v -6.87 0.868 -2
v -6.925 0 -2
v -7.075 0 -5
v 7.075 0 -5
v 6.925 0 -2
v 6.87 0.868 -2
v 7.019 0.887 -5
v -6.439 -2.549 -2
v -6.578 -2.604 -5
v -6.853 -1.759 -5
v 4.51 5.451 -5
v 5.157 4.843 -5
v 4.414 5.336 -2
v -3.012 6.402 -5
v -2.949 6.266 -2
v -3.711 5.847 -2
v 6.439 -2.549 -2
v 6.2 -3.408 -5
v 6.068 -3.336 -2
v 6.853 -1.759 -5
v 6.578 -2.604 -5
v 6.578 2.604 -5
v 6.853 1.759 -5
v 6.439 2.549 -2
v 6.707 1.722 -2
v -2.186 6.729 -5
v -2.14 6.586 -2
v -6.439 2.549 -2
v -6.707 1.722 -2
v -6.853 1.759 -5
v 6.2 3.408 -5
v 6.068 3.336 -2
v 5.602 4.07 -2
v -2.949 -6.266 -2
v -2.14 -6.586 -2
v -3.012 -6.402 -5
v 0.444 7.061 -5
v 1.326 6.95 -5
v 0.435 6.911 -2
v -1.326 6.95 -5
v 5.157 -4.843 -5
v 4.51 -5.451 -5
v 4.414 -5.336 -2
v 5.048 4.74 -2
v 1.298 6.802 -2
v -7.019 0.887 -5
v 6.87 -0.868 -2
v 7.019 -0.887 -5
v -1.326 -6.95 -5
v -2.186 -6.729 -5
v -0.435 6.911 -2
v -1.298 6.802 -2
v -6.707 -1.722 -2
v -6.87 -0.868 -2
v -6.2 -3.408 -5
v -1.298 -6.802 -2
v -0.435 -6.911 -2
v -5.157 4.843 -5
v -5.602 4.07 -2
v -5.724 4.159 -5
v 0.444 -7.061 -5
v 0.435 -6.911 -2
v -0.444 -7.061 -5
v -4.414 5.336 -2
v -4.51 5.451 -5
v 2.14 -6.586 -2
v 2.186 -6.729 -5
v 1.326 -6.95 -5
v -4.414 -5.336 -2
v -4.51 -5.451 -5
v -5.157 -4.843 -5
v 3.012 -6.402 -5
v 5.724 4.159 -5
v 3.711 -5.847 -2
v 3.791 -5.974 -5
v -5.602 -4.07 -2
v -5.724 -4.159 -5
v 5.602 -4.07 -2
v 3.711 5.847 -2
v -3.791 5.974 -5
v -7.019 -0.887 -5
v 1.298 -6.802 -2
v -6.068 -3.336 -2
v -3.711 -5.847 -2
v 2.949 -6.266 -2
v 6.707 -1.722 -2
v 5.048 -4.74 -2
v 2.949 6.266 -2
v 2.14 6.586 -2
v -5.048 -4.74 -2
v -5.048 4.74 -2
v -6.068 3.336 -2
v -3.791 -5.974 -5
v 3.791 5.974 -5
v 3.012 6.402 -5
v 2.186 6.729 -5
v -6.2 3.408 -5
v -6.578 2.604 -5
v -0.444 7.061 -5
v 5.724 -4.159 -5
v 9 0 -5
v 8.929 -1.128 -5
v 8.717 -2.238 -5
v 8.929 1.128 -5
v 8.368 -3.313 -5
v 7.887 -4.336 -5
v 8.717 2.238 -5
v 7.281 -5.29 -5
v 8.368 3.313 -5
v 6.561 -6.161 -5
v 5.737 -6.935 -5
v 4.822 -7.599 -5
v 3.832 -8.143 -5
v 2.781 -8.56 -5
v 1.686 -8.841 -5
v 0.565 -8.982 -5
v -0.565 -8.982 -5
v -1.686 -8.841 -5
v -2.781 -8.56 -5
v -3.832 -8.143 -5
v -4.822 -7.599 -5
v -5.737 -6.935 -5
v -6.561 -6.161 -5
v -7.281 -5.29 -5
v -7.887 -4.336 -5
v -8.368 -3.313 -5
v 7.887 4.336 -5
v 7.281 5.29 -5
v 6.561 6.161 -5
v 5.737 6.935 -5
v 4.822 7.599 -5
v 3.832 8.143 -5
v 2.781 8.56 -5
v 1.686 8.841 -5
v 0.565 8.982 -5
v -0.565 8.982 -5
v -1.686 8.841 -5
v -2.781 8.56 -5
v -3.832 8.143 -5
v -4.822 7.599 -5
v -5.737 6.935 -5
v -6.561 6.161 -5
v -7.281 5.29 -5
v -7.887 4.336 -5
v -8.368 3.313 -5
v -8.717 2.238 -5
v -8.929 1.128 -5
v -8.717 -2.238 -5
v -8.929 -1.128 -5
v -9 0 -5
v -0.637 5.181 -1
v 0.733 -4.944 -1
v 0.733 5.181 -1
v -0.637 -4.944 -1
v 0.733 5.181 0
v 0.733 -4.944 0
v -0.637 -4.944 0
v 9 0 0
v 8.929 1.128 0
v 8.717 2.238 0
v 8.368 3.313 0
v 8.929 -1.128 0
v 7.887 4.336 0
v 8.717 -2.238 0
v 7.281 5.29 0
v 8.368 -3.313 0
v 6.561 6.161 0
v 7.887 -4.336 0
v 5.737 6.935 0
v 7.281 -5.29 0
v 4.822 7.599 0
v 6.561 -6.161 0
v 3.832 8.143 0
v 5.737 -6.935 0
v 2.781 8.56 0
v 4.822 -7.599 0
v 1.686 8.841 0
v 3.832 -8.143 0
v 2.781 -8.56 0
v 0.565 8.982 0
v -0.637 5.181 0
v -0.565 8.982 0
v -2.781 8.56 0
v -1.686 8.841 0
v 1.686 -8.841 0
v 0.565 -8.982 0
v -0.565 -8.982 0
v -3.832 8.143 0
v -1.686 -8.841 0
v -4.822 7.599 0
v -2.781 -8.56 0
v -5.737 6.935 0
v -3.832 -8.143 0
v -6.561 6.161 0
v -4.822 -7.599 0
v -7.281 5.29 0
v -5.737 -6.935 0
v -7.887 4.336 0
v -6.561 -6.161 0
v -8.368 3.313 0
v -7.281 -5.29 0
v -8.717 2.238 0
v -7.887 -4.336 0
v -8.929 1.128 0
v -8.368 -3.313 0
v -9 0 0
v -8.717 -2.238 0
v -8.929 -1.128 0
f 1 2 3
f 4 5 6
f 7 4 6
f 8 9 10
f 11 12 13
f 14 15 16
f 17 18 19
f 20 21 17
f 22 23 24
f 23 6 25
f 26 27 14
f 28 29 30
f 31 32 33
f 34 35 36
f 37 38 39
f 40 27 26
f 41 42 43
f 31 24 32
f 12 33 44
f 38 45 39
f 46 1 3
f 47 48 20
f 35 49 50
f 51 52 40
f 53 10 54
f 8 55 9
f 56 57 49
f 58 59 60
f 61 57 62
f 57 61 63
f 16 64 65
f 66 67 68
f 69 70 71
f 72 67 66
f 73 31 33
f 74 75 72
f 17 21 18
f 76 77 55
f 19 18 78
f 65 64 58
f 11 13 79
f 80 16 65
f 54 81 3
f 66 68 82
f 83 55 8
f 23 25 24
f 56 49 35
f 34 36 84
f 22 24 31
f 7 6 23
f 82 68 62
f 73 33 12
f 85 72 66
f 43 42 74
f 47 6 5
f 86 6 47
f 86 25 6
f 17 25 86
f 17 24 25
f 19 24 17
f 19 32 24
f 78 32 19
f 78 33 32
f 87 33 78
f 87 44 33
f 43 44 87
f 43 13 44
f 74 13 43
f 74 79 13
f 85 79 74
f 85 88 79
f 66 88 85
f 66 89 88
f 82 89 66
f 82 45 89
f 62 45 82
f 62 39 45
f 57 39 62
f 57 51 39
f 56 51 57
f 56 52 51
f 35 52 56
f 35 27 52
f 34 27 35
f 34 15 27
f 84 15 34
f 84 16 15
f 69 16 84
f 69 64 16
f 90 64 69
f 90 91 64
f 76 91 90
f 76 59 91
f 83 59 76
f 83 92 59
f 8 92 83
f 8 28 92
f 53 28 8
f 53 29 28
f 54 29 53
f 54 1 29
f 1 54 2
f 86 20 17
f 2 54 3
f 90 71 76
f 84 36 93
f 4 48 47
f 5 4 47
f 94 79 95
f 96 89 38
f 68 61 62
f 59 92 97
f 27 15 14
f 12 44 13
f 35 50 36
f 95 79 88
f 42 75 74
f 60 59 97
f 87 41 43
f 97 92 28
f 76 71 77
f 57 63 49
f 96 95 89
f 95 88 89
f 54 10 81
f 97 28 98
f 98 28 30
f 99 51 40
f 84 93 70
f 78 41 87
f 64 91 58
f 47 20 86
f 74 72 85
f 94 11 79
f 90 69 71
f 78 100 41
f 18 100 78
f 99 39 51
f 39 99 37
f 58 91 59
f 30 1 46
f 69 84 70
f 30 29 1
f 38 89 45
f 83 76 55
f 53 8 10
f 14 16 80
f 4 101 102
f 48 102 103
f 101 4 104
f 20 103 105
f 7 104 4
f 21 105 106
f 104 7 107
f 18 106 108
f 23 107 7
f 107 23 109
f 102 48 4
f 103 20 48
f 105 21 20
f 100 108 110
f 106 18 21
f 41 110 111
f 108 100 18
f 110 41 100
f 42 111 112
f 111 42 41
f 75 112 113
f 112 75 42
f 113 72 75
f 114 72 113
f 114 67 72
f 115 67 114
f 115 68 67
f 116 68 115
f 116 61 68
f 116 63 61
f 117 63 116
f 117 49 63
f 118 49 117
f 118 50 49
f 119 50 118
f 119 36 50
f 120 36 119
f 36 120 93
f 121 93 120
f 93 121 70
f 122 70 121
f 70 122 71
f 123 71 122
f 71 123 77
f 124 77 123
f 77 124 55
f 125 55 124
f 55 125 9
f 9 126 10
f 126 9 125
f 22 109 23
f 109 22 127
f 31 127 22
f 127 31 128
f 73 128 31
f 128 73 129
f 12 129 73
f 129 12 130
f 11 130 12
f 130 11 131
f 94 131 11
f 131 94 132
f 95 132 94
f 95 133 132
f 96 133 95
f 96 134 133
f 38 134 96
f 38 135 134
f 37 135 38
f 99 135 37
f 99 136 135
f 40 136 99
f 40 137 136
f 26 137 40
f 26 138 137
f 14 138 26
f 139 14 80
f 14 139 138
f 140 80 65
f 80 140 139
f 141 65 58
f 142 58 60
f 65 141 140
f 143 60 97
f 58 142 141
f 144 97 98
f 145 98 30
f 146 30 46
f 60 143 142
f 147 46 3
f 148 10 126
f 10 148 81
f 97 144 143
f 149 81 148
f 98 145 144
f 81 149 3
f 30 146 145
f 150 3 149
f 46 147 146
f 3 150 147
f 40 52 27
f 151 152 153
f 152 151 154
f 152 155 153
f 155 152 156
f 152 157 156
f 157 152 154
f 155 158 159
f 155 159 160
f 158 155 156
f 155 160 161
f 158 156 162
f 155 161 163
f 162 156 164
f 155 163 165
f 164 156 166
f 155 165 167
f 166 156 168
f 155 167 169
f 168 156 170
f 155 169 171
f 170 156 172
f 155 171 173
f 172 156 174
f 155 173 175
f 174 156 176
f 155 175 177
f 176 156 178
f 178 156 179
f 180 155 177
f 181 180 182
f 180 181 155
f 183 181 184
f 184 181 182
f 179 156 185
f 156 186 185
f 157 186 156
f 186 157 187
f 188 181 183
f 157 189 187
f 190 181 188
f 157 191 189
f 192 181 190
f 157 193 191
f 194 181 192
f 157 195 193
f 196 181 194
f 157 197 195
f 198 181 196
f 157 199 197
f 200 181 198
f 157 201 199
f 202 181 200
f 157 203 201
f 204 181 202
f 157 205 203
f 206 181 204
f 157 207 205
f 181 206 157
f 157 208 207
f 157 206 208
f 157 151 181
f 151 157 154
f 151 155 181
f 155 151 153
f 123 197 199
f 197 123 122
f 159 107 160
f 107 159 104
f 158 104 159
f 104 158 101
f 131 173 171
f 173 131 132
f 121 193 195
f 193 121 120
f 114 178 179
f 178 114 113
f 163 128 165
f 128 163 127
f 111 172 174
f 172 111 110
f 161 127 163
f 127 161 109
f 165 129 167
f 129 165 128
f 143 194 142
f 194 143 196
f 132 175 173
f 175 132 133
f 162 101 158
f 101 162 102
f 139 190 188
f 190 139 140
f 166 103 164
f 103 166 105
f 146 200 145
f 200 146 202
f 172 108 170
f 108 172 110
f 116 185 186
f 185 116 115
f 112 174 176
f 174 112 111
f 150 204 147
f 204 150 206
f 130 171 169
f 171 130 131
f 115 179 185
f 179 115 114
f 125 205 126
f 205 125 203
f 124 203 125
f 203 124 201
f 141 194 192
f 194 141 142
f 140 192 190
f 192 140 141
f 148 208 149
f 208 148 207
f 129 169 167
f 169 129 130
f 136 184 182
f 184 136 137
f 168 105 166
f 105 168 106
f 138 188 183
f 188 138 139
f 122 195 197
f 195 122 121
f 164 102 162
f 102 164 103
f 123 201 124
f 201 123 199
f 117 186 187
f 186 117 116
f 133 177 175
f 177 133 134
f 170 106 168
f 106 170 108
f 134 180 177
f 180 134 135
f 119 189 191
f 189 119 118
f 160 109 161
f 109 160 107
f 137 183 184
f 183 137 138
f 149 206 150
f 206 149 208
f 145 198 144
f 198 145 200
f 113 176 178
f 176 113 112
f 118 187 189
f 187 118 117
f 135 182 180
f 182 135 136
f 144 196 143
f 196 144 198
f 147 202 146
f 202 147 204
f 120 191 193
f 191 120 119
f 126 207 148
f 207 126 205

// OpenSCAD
$fn = 50;


difference() {
	union() {
		translate(v = [0, 0, -5.0000000000]) {
			cylinder(h = 5, r = 9.0000000000);
		}
	}
	union() {
		#translate(v = [0, 0, -5.0000000000]) {
			cylinder(h = 3, r1 = 7.0750000000, r2 = 6.9250000000);
		}
		translate(v = [0, 0, -1]) {
			linear_extrude(height = 1) {
				text(font = "Impact", halign = "center", size = 10, text = "I", valign = "center");
			}
		}
	}
}
